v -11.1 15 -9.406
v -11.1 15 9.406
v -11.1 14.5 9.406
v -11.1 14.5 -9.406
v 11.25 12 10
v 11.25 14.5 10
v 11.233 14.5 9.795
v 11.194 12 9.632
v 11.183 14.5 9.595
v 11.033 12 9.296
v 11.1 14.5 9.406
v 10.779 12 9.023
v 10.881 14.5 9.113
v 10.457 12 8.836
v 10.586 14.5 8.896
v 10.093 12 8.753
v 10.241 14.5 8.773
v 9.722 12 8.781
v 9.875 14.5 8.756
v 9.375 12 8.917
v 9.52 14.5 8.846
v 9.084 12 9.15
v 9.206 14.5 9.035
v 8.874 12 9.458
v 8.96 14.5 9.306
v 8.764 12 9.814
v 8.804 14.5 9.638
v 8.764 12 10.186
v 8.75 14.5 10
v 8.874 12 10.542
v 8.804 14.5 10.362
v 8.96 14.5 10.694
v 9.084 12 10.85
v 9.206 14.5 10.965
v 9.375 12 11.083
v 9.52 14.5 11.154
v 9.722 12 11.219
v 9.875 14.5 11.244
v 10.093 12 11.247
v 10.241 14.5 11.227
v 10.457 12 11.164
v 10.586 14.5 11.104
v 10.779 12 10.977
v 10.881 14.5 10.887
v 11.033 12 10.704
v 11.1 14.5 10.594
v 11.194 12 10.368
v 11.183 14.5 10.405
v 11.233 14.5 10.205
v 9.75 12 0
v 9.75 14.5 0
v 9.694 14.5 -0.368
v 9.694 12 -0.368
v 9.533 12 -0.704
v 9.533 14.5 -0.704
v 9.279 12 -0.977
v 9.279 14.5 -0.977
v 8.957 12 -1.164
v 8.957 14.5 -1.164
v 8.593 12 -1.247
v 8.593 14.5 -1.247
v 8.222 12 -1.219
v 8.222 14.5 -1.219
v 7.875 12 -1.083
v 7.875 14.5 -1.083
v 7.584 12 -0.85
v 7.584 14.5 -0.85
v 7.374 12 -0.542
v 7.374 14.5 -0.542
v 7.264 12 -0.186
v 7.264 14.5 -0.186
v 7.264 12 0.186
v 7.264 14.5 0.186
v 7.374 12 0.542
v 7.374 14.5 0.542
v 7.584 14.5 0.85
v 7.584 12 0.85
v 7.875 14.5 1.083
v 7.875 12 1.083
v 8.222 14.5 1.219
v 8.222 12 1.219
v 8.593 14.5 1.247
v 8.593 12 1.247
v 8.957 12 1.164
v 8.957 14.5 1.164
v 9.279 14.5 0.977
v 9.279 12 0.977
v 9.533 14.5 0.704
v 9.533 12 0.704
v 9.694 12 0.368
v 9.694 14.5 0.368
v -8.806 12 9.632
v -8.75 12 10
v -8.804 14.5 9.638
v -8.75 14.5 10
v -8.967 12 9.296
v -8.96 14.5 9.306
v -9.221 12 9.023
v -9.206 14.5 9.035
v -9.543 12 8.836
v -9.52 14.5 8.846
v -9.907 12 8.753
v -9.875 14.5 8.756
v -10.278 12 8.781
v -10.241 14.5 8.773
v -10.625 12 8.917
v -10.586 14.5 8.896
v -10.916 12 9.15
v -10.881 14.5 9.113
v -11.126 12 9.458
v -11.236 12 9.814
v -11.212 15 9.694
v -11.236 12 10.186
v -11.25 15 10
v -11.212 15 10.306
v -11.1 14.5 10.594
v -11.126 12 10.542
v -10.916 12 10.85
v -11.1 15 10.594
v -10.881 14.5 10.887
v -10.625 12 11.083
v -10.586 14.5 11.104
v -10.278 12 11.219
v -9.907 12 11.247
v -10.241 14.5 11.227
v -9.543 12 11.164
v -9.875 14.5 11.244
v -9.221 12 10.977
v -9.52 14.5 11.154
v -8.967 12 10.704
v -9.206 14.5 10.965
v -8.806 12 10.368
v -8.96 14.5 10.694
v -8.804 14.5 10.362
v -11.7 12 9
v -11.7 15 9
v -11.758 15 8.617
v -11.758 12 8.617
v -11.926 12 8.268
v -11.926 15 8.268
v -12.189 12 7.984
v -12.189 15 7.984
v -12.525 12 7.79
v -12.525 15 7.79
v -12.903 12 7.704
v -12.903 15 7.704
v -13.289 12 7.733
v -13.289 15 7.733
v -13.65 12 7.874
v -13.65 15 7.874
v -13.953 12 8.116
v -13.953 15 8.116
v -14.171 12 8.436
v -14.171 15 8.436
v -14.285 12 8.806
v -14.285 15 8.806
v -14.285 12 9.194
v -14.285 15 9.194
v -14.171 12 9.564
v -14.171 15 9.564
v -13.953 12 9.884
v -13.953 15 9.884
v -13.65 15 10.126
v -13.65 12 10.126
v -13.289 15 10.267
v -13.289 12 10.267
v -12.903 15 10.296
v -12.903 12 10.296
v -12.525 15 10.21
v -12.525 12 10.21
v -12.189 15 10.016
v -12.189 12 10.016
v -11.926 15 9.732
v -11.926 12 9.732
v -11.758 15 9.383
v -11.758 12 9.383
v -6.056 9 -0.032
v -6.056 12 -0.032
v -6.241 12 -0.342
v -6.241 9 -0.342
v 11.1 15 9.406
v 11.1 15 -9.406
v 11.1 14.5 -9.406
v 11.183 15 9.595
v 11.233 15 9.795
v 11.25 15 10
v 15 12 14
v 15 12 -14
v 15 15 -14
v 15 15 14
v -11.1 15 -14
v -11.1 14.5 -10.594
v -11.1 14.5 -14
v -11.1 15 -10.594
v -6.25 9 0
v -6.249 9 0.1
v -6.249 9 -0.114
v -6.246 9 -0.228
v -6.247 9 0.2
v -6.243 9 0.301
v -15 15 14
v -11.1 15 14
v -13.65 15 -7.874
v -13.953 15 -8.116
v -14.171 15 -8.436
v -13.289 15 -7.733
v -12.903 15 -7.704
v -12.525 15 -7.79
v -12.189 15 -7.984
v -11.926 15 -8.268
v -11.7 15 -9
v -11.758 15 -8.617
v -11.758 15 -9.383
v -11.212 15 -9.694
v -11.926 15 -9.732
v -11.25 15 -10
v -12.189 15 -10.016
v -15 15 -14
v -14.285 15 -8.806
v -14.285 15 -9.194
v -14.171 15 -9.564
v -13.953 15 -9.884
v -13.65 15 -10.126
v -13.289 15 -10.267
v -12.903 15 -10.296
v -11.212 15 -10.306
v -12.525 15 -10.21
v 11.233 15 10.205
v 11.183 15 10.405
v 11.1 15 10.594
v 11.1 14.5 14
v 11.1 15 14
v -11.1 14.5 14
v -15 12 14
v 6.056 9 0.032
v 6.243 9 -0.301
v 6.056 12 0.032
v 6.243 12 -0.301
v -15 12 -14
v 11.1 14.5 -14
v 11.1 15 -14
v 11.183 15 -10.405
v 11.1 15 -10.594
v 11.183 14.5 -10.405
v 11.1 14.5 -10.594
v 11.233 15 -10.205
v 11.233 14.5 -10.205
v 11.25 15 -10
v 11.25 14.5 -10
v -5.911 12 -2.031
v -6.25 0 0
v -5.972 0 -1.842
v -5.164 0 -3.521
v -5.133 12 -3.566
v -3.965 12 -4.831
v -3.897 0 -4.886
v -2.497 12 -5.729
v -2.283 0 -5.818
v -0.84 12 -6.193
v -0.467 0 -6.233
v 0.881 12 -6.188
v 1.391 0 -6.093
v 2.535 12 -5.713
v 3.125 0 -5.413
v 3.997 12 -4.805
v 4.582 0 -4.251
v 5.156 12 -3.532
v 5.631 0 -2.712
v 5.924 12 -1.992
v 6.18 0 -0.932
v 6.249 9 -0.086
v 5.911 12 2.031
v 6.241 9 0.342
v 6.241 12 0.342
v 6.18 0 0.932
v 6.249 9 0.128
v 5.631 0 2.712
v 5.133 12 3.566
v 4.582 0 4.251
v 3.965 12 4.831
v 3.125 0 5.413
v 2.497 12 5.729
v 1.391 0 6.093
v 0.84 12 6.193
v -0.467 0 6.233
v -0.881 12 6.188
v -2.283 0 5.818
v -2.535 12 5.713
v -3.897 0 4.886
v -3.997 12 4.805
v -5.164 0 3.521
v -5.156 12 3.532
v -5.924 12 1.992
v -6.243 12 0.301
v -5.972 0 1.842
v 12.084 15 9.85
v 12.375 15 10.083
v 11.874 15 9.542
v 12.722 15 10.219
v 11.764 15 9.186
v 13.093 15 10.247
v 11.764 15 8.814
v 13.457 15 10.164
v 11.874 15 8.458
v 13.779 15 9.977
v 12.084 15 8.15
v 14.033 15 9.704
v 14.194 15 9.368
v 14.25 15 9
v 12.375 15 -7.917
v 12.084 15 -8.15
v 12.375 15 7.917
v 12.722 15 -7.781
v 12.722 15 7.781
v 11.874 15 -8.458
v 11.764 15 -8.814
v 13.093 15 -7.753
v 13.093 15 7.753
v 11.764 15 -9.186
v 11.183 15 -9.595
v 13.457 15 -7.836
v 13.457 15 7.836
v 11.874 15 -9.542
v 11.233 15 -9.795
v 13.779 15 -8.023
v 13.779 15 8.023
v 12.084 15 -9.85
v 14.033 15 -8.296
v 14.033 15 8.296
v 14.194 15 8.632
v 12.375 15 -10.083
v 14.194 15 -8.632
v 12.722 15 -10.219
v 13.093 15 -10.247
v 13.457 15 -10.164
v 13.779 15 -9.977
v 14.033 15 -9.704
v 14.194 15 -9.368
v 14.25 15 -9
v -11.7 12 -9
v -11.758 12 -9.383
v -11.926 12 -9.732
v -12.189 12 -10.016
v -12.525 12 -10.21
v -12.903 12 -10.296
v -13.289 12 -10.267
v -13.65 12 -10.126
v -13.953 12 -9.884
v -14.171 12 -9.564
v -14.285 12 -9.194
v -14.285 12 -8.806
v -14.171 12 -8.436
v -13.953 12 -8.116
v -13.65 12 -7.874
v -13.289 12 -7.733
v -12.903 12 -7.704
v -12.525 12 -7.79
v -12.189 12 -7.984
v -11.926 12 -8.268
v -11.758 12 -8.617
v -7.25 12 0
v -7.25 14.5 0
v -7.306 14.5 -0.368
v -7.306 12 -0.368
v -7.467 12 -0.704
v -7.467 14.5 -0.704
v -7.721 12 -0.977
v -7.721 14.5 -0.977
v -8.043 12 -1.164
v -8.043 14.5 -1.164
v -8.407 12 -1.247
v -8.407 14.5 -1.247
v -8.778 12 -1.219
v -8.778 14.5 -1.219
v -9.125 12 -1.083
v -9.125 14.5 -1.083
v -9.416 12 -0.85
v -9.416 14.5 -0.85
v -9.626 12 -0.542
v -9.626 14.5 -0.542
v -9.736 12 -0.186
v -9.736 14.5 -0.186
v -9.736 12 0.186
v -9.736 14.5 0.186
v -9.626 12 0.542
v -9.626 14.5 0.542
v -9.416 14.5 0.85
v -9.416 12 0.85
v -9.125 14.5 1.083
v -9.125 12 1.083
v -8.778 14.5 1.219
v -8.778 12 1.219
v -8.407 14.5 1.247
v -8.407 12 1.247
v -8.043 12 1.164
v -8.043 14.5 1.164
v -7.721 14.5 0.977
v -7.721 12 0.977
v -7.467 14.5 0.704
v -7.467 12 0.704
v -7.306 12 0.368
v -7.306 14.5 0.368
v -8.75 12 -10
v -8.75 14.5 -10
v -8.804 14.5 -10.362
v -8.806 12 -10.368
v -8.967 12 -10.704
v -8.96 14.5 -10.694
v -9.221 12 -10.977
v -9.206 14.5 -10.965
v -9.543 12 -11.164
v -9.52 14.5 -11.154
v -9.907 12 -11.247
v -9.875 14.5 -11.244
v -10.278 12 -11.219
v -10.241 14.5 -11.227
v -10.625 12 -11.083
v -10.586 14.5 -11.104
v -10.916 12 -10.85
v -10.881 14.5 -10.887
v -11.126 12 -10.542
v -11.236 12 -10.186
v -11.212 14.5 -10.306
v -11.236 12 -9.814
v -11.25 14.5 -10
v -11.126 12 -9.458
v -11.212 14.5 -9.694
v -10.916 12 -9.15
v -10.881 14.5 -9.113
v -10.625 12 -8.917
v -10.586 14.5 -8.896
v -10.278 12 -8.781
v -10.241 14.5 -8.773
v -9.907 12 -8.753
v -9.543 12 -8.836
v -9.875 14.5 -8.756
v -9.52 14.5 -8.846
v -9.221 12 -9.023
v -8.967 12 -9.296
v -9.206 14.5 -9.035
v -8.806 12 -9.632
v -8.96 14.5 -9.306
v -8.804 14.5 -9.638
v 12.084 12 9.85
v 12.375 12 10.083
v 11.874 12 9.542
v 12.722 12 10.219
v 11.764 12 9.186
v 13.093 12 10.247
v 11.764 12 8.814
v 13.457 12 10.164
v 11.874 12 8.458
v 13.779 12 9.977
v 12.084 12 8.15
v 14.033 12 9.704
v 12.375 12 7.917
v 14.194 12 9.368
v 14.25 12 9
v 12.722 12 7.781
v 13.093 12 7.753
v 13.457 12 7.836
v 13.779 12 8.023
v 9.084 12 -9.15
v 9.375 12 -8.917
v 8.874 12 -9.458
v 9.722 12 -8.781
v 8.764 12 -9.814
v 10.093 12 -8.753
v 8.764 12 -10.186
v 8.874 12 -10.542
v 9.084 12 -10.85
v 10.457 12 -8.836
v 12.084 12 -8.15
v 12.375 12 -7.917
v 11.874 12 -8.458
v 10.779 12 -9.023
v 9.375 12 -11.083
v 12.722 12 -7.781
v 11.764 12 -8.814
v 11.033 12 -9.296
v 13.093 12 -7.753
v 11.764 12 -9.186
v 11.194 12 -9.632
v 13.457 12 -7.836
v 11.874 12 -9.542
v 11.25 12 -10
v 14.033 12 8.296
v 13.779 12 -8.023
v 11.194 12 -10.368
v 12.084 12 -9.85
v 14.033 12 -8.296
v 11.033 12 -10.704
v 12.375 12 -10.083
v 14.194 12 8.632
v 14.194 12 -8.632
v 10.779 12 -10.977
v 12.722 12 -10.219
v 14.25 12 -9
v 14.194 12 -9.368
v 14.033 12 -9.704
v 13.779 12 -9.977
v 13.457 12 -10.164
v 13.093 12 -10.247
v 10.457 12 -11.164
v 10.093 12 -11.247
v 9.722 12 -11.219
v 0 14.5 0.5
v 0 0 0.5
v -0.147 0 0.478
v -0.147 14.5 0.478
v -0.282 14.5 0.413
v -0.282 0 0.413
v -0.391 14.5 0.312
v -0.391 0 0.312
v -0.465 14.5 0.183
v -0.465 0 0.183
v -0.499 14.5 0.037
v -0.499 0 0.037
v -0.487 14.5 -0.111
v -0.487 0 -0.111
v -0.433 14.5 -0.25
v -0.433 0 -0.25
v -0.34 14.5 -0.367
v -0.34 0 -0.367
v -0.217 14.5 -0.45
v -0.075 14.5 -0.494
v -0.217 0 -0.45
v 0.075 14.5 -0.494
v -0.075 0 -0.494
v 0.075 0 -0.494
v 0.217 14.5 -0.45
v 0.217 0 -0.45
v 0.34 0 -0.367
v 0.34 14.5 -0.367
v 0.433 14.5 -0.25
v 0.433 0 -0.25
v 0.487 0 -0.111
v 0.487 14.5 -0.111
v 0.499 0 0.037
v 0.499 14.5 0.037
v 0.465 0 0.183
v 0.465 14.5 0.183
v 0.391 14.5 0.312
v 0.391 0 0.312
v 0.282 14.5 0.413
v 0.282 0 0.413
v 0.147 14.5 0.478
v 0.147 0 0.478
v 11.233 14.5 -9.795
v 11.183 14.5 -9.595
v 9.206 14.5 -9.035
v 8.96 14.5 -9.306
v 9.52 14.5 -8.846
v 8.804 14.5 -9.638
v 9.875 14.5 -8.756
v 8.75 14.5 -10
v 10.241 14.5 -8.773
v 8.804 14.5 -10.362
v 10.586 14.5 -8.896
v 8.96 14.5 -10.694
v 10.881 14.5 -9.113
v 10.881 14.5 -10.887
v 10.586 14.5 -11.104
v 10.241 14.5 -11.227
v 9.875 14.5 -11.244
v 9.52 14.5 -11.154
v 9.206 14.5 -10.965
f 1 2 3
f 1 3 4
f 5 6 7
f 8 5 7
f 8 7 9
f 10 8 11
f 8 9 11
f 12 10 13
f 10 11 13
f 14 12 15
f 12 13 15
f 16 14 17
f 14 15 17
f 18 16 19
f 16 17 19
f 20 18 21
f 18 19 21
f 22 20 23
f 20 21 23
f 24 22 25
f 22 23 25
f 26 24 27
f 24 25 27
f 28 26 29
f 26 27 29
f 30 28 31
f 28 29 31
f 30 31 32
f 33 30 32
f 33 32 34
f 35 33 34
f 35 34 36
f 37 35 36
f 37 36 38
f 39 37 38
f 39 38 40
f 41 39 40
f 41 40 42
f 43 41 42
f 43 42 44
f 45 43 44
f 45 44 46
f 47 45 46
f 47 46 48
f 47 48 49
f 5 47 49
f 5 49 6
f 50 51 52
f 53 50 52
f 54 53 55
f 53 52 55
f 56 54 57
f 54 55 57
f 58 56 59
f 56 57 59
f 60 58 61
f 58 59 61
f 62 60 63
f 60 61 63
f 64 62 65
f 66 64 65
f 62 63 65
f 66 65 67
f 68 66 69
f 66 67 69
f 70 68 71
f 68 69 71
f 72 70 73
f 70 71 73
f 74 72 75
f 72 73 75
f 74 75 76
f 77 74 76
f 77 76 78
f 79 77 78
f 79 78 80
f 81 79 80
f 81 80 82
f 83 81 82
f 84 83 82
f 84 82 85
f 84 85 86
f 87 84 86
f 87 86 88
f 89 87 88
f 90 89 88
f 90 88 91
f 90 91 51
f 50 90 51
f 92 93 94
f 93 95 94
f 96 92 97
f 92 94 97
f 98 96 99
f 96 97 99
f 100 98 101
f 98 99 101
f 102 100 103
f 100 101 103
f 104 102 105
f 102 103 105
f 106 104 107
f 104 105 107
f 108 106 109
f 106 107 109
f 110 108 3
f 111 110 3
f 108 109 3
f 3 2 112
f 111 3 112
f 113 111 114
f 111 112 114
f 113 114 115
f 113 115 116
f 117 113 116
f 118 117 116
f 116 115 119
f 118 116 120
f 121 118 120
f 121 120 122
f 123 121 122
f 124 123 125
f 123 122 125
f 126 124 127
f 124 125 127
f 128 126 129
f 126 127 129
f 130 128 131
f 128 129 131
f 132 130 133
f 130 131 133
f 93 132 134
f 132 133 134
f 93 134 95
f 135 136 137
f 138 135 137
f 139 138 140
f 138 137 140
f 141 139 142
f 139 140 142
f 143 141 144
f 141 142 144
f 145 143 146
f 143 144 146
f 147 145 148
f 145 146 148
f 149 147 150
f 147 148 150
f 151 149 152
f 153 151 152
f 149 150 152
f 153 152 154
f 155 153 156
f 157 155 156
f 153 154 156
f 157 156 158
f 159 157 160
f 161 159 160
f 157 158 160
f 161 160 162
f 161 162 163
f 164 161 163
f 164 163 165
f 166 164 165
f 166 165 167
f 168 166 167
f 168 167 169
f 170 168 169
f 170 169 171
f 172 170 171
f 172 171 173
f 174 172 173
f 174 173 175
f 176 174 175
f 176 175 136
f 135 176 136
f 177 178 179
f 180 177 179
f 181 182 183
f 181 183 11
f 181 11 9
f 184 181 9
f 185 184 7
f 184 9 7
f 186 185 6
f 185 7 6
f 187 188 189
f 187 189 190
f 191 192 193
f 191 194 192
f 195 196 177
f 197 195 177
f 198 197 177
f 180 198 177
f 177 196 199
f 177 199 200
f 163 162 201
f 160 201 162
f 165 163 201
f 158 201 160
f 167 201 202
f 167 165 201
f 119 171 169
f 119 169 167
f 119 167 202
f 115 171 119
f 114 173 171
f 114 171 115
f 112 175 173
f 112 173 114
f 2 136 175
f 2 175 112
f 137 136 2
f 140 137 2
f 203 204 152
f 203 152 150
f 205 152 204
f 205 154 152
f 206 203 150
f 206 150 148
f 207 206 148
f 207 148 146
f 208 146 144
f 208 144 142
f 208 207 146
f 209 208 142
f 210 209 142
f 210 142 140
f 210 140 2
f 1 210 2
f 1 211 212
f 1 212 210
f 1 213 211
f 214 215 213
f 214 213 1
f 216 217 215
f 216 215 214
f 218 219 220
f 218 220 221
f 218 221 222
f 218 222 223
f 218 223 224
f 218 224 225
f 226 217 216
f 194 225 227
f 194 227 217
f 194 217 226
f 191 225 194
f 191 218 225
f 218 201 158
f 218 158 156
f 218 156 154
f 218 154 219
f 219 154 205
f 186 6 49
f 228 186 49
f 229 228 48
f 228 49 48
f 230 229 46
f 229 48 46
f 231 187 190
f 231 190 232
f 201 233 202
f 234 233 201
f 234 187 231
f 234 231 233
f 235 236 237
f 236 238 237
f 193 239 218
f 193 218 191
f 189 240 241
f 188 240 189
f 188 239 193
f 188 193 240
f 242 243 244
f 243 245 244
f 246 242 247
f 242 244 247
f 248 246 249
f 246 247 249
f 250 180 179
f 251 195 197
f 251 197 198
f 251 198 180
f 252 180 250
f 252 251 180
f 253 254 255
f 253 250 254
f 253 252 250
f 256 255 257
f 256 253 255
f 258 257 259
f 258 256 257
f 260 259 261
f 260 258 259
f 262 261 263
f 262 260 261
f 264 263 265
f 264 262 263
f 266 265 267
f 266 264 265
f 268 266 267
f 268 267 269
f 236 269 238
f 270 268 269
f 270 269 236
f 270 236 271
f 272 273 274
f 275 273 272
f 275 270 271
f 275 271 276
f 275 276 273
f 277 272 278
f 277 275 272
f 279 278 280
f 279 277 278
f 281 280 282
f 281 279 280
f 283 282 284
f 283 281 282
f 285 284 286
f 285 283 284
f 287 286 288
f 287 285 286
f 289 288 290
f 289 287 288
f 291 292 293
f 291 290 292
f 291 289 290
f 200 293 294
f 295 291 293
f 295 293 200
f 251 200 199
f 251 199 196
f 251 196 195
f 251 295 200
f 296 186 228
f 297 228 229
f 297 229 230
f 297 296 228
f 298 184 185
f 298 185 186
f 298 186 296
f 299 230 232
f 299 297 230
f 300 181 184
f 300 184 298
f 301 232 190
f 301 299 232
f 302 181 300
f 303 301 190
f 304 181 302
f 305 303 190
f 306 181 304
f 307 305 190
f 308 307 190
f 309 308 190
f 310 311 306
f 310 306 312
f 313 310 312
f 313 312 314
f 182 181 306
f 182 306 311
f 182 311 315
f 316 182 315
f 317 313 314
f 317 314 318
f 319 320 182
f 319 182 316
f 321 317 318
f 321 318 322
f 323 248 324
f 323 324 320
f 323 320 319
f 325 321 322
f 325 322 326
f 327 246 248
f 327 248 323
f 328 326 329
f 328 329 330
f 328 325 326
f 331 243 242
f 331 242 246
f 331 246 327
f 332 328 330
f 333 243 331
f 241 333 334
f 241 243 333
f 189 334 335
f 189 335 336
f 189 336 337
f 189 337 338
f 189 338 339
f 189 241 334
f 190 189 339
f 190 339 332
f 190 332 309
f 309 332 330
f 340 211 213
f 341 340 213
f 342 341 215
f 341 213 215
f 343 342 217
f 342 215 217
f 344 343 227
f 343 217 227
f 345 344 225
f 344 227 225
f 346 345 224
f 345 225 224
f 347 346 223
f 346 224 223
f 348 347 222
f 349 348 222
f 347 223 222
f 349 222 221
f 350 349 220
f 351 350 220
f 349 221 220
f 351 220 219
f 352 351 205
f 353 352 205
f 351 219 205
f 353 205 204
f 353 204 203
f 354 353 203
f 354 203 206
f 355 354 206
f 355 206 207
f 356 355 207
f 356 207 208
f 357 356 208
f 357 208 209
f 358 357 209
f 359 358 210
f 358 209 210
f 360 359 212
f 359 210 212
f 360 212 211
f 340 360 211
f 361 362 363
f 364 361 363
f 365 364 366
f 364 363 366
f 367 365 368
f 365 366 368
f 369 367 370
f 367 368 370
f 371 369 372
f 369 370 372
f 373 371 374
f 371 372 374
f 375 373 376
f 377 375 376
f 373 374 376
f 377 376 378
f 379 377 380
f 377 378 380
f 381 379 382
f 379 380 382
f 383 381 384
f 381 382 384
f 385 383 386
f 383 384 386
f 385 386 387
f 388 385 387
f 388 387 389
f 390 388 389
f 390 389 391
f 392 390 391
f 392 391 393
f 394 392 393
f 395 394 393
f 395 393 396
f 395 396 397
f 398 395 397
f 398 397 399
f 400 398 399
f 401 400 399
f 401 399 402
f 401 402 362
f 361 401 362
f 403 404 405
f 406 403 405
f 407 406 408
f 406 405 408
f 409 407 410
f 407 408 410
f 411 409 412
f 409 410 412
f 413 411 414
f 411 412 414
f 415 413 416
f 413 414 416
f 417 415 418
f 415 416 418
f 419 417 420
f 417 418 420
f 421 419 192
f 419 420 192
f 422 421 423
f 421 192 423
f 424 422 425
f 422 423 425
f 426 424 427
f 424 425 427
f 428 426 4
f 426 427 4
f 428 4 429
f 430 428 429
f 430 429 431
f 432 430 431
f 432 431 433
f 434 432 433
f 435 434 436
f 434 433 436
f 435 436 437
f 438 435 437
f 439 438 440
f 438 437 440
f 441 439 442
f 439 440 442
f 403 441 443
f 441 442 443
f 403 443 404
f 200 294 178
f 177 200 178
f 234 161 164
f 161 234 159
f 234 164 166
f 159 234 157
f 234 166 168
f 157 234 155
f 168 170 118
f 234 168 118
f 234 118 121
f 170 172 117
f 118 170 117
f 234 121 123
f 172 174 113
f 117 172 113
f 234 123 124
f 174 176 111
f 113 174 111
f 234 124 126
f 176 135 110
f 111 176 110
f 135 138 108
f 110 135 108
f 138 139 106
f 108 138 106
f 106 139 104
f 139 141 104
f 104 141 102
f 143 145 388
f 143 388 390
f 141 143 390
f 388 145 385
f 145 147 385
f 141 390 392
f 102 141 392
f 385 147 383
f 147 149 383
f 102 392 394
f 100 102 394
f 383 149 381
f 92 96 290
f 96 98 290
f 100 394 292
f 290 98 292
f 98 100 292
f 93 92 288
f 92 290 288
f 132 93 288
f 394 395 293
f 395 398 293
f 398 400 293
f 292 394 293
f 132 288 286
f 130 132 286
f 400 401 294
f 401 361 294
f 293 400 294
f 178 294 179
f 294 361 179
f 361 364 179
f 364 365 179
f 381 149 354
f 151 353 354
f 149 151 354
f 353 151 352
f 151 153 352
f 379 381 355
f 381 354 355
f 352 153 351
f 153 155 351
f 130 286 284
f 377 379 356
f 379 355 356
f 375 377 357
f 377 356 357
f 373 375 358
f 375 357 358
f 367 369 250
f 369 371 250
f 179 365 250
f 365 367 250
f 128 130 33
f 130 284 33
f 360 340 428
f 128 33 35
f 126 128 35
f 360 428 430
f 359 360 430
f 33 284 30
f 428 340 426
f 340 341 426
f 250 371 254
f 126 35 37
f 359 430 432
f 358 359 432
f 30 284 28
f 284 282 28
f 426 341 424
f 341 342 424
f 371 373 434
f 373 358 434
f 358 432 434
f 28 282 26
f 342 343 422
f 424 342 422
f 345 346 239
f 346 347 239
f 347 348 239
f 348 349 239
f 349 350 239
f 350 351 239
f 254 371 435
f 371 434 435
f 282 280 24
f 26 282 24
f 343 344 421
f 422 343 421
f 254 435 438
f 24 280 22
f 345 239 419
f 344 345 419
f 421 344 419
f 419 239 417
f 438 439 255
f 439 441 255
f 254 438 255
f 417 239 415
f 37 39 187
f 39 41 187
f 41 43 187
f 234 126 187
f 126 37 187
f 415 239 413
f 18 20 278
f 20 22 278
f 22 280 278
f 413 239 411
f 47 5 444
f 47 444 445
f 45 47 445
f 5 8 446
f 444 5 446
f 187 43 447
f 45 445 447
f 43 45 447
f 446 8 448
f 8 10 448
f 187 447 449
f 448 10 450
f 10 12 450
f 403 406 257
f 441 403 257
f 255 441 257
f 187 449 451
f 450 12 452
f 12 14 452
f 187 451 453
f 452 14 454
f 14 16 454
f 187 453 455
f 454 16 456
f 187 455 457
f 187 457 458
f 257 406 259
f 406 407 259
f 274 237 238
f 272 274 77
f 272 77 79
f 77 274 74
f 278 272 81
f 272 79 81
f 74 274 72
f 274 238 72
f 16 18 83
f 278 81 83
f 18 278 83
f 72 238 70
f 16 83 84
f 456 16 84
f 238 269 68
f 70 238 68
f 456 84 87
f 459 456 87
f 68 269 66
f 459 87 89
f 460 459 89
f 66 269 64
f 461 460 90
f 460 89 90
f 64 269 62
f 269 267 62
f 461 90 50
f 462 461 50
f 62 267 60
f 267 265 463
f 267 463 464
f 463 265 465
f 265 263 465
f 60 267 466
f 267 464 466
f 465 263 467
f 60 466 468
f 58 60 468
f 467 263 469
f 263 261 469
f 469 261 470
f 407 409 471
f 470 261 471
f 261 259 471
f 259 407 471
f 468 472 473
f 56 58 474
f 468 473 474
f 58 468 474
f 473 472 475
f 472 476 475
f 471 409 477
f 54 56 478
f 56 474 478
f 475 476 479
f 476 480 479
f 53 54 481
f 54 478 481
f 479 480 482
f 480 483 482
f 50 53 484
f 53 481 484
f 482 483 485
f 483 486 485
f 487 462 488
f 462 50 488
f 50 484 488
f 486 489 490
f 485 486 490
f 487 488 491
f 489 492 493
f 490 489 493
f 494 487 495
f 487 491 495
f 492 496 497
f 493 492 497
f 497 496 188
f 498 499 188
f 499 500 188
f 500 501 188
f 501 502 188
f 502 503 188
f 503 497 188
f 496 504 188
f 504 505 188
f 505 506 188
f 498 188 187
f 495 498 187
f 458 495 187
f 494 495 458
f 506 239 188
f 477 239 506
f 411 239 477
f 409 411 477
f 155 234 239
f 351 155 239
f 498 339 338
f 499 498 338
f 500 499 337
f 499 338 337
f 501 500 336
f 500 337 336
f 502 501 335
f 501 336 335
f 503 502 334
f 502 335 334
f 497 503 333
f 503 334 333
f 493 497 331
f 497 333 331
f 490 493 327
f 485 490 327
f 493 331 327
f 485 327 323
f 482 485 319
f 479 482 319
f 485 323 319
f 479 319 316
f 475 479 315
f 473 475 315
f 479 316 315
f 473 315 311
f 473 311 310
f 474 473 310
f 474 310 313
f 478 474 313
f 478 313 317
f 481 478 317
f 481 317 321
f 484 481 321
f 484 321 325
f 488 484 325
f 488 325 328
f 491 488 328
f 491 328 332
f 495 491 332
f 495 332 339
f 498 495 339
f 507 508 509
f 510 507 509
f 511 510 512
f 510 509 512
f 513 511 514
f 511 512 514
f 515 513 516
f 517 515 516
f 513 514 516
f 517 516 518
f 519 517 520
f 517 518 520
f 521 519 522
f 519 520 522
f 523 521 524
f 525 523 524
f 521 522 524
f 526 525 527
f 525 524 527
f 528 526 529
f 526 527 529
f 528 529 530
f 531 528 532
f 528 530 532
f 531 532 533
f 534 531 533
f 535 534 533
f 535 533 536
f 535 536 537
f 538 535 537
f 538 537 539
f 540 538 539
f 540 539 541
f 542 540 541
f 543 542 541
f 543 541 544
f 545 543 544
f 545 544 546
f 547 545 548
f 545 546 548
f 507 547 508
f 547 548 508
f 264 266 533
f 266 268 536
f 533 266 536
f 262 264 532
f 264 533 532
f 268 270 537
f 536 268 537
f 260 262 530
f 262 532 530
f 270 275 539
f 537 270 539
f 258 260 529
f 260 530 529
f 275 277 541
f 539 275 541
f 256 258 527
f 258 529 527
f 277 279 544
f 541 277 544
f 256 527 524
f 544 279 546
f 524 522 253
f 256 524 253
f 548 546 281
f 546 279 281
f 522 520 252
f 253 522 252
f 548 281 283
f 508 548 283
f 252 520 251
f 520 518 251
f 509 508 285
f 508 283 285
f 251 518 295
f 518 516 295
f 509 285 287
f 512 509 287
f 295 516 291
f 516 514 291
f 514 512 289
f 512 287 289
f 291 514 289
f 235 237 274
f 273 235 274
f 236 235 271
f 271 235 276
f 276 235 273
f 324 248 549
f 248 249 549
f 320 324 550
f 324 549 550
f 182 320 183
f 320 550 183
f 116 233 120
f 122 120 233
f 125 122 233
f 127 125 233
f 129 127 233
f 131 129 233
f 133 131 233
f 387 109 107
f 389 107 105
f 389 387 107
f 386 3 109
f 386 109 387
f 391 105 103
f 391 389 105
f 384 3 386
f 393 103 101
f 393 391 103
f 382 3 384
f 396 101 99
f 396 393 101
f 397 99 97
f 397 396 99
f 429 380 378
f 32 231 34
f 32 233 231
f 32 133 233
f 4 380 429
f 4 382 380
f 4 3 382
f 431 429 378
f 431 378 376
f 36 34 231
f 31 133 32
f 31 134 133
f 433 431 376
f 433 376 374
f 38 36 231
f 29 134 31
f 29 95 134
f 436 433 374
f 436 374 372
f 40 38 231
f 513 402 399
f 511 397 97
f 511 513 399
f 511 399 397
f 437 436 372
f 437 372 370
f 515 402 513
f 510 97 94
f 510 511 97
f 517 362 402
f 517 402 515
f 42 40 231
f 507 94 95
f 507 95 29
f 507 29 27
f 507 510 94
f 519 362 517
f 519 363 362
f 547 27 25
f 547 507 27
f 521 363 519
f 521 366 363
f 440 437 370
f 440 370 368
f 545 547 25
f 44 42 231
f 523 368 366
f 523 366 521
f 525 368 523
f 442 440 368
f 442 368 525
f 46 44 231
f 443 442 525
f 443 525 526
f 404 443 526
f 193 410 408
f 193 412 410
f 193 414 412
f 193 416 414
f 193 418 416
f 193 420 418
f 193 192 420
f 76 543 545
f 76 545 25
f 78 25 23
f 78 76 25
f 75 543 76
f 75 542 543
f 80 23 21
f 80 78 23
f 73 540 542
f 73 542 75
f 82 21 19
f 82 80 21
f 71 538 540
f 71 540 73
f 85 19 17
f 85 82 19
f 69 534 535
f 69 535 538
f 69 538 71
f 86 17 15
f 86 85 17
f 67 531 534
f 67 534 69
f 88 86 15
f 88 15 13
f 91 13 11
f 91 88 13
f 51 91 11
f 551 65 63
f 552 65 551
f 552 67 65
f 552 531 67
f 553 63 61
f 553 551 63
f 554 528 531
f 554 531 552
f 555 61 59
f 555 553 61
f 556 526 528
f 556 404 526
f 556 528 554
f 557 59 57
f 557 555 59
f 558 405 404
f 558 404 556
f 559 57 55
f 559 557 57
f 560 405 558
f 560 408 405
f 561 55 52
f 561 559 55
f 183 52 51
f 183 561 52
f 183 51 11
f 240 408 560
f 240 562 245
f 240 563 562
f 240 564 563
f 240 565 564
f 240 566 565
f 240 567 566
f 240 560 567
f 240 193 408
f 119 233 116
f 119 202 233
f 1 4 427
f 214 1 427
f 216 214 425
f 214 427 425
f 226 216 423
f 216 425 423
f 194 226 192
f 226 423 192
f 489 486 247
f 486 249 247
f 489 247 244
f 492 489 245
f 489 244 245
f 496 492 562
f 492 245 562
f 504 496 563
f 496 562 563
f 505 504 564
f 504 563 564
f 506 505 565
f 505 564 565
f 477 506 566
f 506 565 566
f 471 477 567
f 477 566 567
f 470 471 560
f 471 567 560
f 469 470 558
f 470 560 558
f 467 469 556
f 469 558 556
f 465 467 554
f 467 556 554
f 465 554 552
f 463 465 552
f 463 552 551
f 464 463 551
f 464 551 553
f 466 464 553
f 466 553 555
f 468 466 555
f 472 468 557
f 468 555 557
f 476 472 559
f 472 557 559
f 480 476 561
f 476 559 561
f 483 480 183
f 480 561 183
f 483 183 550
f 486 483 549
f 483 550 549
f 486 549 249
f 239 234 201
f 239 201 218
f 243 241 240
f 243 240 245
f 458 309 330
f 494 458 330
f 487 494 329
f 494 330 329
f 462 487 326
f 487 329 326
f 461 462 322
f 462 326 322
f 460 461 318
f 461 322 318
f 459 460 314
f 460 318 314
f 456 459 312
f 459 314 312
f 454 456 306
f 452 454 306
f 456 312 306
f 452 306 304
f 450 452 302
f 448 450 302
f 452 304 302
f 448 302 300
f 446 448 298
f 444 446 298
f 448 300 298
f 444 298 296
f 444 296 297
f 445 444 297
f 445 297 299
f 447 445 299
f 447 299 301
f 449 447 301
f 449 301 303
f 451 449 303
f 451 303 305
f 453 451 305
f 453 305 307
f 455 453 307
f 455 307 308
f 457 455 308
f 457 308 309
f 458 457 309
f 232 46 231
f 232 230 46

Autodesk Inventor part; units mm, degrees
ref_plane "YZ Plane" through (0, 0, 0) normal (1, 0, 0) x (0, 1, 0)
ref_plane "XZ Plane" through (0, 0, 0) normal (0, 1, 0) x (-1, 0, 0)
ref_plane "XY Plane" through (0, 0, 0) normal (0, 0, 1) x (1, 0, 0)
sketch "Sketch1" plane through (0, 0, 0) normal (0, 1, 0) x (-1, 0, 0)
  circle A0 centre (0, 0) radius 6.25
  dimension "d0" = 12.5
extrude "Extrusion1" add sketch "Sketch1" along normal blind 12
sketch "Sketch2" plane through (0, 12, 0) normal (0, 1, 0) x (1, 0, 0)
  line L0 (-15, 14) -> (15, 14)
  line L1 (15, 14) -> (15, -14)
  line L2 (15, -14) -> (-15, -14)
  line L3 (-15, -14) -> (-15, 14)
  point P0 (0, 0)
  dimension "d3" = 30
  dimension "d4" = 28
  dimension "d5" = 14
  dimension "d6" = 15
extrude "Extrusion2" add sketch "Sketch2" along normal blind 3
sketch "Sketch3" plane through (0, 15, 0) normal (0, 1, 0) x (1, 0, 0)
  line L0 (-15, -14) -> (15, -14) projected
  line L1 (15, 14) -> (-15, 14) projected
  line L2 (11.1, -14) -> (-11.1, -14)
  line L3 (-11.1, -14) -> (-11.1, 14)
  line L4 (-11.1, 14) -> (11.1, 14)
  line L5 (11.1, 14) -> (11.1, -14)
  line L6 (-15, 14) -> (-15, -14) projected
  point P0 (0, 0)
  point P1 (11.1, 14)
  point P2 (-11.1, -14)
  dimension "d9" = 22.2
  dimension "d10" = 3.9
extrude "Extrusion3" cut sketch "Sketch3" against normal blind 0.5 contours L3 L1 L5 L0
sketch "Sketch4" plane through (0, 14.5, 0) normal (0, 1, 0) x (1, 0, 0)
  circle A0 centre (8.5, 0) radius 1.25
  circle A1 centre (-8.5, 0) radius 1.25
  point P0 (0, 0)
  dimension "d13" = 2.5
  dimension "d14" = 8.5
  dimension "d15" = 2.5
  dimension "d16" = 8.5
extrude "Extrusion4" cut sketch "Sketch4" against normal blind 5
sketch "Sketch5" plane through (0, 12, 0) normal (0, -1, 0) x (1, 0, 0)
  line L0 (7.4961, 2.1) -> (15, 2.1)
  line L1 (15, 2.1) -> (15, -2.1)
  line L2 (15, -2.1) -> (7.4961, -2.1)
  line L3 (7.4961, -2.1) -> (7.4961, 2.1)
  line L4 (15, 14) -> (15, -14) projected
  circle A0 centre (8.5, 0) radius 1.25 projected
  line L5 (9.75, 2.1) -> (10.9437, -0.0325)
  line L6 (10.9437, -0.0325) -> (9.6937, -2.1325)
  line L7 (9.6937, -2.1325) -> (7.25, -2.1)
  line L8 (7.25, -2.1) -> (6.0563, 0.0325)
  line L9 (6.0563, 0.0325) -> (7.3063, 2.1325)
  line L10 (7.3063, 2.1325) -> (9.75, 2.1)
  line L11 (-15, -14) -> (-15, 14) projected
  line L12 (-15, -2.1) -> (-7.25, -2.1)
  line L13 (-7.25, -2.1) -> (-7.25, 2.1)
  line L14 (-7.25, 2.1) -> (-15, 2.1)
  line L15 (-15, 2.1) -> (-15, -2.1)
  circle A1 centre (-8.5, 0) radius 1.25 projected
  line L16 (-7.25, 2.1) -> (-6.0563, -0.0325)
  line L17 (-6.0563, -0.0325) -> (-7.3063, -2.1325)
  line L18 (-7.3063, -2.1325) -> (-9.75, -2.1)
  line L19 (-9.75, -2.1) -> (-10.9437, 0.0325)
  line L20 (-10.9437, 0.0325) -> (-9.6937, 2.1325)
  line L21 (-9.6937, 2.1325) -> (-7.25, 2.1)
  point P0 (0, 0)
  point P1 (9.713, -2.1)
  point P2 (-9.713, 2.1)
  dimension "d19" = 4.2
  dimension "d20" = 0
  dimension "d21" = 2.1
  dimension "d24" = 4.2
  dimension "d25" = 2.1
extrude "Extrusion5" cut sketch "Sketch5" along normal blind 3 contours L3 A0 L2 L6 L7 L8 L9 L10 L0 | L0 L5 L6 L2 L3 A0 | L0 L1 L2 L6 L5 | A0 L3 | L3 A0 | L11 L14 L20 L19 L12 | A1 | L19 L20 L14 L13 L17 L12 | L12 L17 L18 | L20 L21 L14 | L16 L17 L13
sketch "Sketch6" plane through (0, 14.5, 0) normal (0, 1, 0) x (1, 0, 0)
  line L0 (-11.1, -14) -> (-11.1, 14) projected
  line L1 (-11.1, 11) -> (11.1, 11)
  line L2 (11.1, 11) -> (11.1, -11)
  line L3 (11.1, -11) -> (-11.1, -11)
  line L4 (-11.1, -11) -> (-11.1, 11)
  line L5 (-11.1, 14) -> (11.1, 14) projected
  circle A0 centre (-13, -9) radius 1.3
  line L6 (-15, -14) -> (-11.1, -14) projected
  circle A1 centre (-13, 9) radius 1.3
  line L7 (-11.1, 14) -> (-15, 14) projected
  circle A2 centre (13, 9) radius 1.25
  line L8 (11.1, 14) -> (11.1, -14) projected
  circle A3 centre (13, -9) radius 1.25
  line L9 (11.1, -14) -> (15, -14) projected
  point P0 (0, 0)
  dimension "d26" = 22.2
  dimension "d27" = 22
  dimension "d28" = 3
  dimension "d29" = 2.6
  dimension "d30" = 1.9
  dimension "d31" = 5
  dimension "d32" = 2.6
  dimension "d33" = 1.9
  dimension "d34" = 5
  dimension "d35" = 2.5
  dimension "d36" = 1.9
  dimension "d37" = 5
  dimension "d38" = 2.5
  dimension "d39" = 1.9
  dimension "d40" = 5
extrude "Extrusion6" cut sketch "Sketch6" along normal mid plane 5 contours A0 | A1 | A2 | A3
sketch "Sketch7" plane through (0, 14.5, 0) normal (0, 1, 0) x (1, 0, 0)
  circle A0 centre (-10, 10) radius 1.25
  line L0 (0, 0) -> (4.1718, 0)
  line L1 (0, 0) -> (0, 4.2645)
  circle A1 centre (10, 10) radius 1.25
  circle A2 centre (-10, -10) radius 1.25
  circle A3 centre (10, -10) radius 1.25
  dimension "d43" = 2.5
  dimension "d44" = 10
  dimension "d45" = 10
  dimension "d48" = 20
  dimension "d51" = 20
extrude "Extrusion7" cut sketch "Sketch7" along normal blind 10 and the other way blind 5
sketch "Sketch8" plane through (0, 12, 0) normal (0, -1, 0) x (1, 0, 0)
  arc A0 (11.1, -9.4063) -> (11.1, -10.5937) centre (10, -10) ccw projected
  circle A1 centre (10, -10) radius 2.5
  circle A2 centre (-10, -10) radius 1.25 projected
  circle A3 centre (-10, -10) radius 2.5
  arc A4 (-11.1, 9.4063) -> (-11.1, 10.5937) centre (-10, 10) ccw projected
  circle A5 centre (-10, 10) radius 2.5
  arc A6 (11.1, 10.5937) -> (11.1, 9.4063) centre (10, 10) ccw projected
  circle A7 centre (10, 10) radius 2.5
  point P0 (0, 0)
  dimension "d58" = 5
  dimension "d59" = 5
  dimension "d60" = 5
  dimension "d61" = 5
extrude "Extrusion8" cut sketch "Sketch8" along normal blind 5
sketch "Sketch9" plane through (0, 14.5, 0) normal (0, 1, 0) x (1, 0, 0)
  point P0 (0, 0)
  point P1 (0, 0)
hole "Hole1" at (0, 14.5, 0) direction (0, -1, 0) diameter 1 end through all
properties part number "200205 - Holder for MEMS on halfinch mount"
